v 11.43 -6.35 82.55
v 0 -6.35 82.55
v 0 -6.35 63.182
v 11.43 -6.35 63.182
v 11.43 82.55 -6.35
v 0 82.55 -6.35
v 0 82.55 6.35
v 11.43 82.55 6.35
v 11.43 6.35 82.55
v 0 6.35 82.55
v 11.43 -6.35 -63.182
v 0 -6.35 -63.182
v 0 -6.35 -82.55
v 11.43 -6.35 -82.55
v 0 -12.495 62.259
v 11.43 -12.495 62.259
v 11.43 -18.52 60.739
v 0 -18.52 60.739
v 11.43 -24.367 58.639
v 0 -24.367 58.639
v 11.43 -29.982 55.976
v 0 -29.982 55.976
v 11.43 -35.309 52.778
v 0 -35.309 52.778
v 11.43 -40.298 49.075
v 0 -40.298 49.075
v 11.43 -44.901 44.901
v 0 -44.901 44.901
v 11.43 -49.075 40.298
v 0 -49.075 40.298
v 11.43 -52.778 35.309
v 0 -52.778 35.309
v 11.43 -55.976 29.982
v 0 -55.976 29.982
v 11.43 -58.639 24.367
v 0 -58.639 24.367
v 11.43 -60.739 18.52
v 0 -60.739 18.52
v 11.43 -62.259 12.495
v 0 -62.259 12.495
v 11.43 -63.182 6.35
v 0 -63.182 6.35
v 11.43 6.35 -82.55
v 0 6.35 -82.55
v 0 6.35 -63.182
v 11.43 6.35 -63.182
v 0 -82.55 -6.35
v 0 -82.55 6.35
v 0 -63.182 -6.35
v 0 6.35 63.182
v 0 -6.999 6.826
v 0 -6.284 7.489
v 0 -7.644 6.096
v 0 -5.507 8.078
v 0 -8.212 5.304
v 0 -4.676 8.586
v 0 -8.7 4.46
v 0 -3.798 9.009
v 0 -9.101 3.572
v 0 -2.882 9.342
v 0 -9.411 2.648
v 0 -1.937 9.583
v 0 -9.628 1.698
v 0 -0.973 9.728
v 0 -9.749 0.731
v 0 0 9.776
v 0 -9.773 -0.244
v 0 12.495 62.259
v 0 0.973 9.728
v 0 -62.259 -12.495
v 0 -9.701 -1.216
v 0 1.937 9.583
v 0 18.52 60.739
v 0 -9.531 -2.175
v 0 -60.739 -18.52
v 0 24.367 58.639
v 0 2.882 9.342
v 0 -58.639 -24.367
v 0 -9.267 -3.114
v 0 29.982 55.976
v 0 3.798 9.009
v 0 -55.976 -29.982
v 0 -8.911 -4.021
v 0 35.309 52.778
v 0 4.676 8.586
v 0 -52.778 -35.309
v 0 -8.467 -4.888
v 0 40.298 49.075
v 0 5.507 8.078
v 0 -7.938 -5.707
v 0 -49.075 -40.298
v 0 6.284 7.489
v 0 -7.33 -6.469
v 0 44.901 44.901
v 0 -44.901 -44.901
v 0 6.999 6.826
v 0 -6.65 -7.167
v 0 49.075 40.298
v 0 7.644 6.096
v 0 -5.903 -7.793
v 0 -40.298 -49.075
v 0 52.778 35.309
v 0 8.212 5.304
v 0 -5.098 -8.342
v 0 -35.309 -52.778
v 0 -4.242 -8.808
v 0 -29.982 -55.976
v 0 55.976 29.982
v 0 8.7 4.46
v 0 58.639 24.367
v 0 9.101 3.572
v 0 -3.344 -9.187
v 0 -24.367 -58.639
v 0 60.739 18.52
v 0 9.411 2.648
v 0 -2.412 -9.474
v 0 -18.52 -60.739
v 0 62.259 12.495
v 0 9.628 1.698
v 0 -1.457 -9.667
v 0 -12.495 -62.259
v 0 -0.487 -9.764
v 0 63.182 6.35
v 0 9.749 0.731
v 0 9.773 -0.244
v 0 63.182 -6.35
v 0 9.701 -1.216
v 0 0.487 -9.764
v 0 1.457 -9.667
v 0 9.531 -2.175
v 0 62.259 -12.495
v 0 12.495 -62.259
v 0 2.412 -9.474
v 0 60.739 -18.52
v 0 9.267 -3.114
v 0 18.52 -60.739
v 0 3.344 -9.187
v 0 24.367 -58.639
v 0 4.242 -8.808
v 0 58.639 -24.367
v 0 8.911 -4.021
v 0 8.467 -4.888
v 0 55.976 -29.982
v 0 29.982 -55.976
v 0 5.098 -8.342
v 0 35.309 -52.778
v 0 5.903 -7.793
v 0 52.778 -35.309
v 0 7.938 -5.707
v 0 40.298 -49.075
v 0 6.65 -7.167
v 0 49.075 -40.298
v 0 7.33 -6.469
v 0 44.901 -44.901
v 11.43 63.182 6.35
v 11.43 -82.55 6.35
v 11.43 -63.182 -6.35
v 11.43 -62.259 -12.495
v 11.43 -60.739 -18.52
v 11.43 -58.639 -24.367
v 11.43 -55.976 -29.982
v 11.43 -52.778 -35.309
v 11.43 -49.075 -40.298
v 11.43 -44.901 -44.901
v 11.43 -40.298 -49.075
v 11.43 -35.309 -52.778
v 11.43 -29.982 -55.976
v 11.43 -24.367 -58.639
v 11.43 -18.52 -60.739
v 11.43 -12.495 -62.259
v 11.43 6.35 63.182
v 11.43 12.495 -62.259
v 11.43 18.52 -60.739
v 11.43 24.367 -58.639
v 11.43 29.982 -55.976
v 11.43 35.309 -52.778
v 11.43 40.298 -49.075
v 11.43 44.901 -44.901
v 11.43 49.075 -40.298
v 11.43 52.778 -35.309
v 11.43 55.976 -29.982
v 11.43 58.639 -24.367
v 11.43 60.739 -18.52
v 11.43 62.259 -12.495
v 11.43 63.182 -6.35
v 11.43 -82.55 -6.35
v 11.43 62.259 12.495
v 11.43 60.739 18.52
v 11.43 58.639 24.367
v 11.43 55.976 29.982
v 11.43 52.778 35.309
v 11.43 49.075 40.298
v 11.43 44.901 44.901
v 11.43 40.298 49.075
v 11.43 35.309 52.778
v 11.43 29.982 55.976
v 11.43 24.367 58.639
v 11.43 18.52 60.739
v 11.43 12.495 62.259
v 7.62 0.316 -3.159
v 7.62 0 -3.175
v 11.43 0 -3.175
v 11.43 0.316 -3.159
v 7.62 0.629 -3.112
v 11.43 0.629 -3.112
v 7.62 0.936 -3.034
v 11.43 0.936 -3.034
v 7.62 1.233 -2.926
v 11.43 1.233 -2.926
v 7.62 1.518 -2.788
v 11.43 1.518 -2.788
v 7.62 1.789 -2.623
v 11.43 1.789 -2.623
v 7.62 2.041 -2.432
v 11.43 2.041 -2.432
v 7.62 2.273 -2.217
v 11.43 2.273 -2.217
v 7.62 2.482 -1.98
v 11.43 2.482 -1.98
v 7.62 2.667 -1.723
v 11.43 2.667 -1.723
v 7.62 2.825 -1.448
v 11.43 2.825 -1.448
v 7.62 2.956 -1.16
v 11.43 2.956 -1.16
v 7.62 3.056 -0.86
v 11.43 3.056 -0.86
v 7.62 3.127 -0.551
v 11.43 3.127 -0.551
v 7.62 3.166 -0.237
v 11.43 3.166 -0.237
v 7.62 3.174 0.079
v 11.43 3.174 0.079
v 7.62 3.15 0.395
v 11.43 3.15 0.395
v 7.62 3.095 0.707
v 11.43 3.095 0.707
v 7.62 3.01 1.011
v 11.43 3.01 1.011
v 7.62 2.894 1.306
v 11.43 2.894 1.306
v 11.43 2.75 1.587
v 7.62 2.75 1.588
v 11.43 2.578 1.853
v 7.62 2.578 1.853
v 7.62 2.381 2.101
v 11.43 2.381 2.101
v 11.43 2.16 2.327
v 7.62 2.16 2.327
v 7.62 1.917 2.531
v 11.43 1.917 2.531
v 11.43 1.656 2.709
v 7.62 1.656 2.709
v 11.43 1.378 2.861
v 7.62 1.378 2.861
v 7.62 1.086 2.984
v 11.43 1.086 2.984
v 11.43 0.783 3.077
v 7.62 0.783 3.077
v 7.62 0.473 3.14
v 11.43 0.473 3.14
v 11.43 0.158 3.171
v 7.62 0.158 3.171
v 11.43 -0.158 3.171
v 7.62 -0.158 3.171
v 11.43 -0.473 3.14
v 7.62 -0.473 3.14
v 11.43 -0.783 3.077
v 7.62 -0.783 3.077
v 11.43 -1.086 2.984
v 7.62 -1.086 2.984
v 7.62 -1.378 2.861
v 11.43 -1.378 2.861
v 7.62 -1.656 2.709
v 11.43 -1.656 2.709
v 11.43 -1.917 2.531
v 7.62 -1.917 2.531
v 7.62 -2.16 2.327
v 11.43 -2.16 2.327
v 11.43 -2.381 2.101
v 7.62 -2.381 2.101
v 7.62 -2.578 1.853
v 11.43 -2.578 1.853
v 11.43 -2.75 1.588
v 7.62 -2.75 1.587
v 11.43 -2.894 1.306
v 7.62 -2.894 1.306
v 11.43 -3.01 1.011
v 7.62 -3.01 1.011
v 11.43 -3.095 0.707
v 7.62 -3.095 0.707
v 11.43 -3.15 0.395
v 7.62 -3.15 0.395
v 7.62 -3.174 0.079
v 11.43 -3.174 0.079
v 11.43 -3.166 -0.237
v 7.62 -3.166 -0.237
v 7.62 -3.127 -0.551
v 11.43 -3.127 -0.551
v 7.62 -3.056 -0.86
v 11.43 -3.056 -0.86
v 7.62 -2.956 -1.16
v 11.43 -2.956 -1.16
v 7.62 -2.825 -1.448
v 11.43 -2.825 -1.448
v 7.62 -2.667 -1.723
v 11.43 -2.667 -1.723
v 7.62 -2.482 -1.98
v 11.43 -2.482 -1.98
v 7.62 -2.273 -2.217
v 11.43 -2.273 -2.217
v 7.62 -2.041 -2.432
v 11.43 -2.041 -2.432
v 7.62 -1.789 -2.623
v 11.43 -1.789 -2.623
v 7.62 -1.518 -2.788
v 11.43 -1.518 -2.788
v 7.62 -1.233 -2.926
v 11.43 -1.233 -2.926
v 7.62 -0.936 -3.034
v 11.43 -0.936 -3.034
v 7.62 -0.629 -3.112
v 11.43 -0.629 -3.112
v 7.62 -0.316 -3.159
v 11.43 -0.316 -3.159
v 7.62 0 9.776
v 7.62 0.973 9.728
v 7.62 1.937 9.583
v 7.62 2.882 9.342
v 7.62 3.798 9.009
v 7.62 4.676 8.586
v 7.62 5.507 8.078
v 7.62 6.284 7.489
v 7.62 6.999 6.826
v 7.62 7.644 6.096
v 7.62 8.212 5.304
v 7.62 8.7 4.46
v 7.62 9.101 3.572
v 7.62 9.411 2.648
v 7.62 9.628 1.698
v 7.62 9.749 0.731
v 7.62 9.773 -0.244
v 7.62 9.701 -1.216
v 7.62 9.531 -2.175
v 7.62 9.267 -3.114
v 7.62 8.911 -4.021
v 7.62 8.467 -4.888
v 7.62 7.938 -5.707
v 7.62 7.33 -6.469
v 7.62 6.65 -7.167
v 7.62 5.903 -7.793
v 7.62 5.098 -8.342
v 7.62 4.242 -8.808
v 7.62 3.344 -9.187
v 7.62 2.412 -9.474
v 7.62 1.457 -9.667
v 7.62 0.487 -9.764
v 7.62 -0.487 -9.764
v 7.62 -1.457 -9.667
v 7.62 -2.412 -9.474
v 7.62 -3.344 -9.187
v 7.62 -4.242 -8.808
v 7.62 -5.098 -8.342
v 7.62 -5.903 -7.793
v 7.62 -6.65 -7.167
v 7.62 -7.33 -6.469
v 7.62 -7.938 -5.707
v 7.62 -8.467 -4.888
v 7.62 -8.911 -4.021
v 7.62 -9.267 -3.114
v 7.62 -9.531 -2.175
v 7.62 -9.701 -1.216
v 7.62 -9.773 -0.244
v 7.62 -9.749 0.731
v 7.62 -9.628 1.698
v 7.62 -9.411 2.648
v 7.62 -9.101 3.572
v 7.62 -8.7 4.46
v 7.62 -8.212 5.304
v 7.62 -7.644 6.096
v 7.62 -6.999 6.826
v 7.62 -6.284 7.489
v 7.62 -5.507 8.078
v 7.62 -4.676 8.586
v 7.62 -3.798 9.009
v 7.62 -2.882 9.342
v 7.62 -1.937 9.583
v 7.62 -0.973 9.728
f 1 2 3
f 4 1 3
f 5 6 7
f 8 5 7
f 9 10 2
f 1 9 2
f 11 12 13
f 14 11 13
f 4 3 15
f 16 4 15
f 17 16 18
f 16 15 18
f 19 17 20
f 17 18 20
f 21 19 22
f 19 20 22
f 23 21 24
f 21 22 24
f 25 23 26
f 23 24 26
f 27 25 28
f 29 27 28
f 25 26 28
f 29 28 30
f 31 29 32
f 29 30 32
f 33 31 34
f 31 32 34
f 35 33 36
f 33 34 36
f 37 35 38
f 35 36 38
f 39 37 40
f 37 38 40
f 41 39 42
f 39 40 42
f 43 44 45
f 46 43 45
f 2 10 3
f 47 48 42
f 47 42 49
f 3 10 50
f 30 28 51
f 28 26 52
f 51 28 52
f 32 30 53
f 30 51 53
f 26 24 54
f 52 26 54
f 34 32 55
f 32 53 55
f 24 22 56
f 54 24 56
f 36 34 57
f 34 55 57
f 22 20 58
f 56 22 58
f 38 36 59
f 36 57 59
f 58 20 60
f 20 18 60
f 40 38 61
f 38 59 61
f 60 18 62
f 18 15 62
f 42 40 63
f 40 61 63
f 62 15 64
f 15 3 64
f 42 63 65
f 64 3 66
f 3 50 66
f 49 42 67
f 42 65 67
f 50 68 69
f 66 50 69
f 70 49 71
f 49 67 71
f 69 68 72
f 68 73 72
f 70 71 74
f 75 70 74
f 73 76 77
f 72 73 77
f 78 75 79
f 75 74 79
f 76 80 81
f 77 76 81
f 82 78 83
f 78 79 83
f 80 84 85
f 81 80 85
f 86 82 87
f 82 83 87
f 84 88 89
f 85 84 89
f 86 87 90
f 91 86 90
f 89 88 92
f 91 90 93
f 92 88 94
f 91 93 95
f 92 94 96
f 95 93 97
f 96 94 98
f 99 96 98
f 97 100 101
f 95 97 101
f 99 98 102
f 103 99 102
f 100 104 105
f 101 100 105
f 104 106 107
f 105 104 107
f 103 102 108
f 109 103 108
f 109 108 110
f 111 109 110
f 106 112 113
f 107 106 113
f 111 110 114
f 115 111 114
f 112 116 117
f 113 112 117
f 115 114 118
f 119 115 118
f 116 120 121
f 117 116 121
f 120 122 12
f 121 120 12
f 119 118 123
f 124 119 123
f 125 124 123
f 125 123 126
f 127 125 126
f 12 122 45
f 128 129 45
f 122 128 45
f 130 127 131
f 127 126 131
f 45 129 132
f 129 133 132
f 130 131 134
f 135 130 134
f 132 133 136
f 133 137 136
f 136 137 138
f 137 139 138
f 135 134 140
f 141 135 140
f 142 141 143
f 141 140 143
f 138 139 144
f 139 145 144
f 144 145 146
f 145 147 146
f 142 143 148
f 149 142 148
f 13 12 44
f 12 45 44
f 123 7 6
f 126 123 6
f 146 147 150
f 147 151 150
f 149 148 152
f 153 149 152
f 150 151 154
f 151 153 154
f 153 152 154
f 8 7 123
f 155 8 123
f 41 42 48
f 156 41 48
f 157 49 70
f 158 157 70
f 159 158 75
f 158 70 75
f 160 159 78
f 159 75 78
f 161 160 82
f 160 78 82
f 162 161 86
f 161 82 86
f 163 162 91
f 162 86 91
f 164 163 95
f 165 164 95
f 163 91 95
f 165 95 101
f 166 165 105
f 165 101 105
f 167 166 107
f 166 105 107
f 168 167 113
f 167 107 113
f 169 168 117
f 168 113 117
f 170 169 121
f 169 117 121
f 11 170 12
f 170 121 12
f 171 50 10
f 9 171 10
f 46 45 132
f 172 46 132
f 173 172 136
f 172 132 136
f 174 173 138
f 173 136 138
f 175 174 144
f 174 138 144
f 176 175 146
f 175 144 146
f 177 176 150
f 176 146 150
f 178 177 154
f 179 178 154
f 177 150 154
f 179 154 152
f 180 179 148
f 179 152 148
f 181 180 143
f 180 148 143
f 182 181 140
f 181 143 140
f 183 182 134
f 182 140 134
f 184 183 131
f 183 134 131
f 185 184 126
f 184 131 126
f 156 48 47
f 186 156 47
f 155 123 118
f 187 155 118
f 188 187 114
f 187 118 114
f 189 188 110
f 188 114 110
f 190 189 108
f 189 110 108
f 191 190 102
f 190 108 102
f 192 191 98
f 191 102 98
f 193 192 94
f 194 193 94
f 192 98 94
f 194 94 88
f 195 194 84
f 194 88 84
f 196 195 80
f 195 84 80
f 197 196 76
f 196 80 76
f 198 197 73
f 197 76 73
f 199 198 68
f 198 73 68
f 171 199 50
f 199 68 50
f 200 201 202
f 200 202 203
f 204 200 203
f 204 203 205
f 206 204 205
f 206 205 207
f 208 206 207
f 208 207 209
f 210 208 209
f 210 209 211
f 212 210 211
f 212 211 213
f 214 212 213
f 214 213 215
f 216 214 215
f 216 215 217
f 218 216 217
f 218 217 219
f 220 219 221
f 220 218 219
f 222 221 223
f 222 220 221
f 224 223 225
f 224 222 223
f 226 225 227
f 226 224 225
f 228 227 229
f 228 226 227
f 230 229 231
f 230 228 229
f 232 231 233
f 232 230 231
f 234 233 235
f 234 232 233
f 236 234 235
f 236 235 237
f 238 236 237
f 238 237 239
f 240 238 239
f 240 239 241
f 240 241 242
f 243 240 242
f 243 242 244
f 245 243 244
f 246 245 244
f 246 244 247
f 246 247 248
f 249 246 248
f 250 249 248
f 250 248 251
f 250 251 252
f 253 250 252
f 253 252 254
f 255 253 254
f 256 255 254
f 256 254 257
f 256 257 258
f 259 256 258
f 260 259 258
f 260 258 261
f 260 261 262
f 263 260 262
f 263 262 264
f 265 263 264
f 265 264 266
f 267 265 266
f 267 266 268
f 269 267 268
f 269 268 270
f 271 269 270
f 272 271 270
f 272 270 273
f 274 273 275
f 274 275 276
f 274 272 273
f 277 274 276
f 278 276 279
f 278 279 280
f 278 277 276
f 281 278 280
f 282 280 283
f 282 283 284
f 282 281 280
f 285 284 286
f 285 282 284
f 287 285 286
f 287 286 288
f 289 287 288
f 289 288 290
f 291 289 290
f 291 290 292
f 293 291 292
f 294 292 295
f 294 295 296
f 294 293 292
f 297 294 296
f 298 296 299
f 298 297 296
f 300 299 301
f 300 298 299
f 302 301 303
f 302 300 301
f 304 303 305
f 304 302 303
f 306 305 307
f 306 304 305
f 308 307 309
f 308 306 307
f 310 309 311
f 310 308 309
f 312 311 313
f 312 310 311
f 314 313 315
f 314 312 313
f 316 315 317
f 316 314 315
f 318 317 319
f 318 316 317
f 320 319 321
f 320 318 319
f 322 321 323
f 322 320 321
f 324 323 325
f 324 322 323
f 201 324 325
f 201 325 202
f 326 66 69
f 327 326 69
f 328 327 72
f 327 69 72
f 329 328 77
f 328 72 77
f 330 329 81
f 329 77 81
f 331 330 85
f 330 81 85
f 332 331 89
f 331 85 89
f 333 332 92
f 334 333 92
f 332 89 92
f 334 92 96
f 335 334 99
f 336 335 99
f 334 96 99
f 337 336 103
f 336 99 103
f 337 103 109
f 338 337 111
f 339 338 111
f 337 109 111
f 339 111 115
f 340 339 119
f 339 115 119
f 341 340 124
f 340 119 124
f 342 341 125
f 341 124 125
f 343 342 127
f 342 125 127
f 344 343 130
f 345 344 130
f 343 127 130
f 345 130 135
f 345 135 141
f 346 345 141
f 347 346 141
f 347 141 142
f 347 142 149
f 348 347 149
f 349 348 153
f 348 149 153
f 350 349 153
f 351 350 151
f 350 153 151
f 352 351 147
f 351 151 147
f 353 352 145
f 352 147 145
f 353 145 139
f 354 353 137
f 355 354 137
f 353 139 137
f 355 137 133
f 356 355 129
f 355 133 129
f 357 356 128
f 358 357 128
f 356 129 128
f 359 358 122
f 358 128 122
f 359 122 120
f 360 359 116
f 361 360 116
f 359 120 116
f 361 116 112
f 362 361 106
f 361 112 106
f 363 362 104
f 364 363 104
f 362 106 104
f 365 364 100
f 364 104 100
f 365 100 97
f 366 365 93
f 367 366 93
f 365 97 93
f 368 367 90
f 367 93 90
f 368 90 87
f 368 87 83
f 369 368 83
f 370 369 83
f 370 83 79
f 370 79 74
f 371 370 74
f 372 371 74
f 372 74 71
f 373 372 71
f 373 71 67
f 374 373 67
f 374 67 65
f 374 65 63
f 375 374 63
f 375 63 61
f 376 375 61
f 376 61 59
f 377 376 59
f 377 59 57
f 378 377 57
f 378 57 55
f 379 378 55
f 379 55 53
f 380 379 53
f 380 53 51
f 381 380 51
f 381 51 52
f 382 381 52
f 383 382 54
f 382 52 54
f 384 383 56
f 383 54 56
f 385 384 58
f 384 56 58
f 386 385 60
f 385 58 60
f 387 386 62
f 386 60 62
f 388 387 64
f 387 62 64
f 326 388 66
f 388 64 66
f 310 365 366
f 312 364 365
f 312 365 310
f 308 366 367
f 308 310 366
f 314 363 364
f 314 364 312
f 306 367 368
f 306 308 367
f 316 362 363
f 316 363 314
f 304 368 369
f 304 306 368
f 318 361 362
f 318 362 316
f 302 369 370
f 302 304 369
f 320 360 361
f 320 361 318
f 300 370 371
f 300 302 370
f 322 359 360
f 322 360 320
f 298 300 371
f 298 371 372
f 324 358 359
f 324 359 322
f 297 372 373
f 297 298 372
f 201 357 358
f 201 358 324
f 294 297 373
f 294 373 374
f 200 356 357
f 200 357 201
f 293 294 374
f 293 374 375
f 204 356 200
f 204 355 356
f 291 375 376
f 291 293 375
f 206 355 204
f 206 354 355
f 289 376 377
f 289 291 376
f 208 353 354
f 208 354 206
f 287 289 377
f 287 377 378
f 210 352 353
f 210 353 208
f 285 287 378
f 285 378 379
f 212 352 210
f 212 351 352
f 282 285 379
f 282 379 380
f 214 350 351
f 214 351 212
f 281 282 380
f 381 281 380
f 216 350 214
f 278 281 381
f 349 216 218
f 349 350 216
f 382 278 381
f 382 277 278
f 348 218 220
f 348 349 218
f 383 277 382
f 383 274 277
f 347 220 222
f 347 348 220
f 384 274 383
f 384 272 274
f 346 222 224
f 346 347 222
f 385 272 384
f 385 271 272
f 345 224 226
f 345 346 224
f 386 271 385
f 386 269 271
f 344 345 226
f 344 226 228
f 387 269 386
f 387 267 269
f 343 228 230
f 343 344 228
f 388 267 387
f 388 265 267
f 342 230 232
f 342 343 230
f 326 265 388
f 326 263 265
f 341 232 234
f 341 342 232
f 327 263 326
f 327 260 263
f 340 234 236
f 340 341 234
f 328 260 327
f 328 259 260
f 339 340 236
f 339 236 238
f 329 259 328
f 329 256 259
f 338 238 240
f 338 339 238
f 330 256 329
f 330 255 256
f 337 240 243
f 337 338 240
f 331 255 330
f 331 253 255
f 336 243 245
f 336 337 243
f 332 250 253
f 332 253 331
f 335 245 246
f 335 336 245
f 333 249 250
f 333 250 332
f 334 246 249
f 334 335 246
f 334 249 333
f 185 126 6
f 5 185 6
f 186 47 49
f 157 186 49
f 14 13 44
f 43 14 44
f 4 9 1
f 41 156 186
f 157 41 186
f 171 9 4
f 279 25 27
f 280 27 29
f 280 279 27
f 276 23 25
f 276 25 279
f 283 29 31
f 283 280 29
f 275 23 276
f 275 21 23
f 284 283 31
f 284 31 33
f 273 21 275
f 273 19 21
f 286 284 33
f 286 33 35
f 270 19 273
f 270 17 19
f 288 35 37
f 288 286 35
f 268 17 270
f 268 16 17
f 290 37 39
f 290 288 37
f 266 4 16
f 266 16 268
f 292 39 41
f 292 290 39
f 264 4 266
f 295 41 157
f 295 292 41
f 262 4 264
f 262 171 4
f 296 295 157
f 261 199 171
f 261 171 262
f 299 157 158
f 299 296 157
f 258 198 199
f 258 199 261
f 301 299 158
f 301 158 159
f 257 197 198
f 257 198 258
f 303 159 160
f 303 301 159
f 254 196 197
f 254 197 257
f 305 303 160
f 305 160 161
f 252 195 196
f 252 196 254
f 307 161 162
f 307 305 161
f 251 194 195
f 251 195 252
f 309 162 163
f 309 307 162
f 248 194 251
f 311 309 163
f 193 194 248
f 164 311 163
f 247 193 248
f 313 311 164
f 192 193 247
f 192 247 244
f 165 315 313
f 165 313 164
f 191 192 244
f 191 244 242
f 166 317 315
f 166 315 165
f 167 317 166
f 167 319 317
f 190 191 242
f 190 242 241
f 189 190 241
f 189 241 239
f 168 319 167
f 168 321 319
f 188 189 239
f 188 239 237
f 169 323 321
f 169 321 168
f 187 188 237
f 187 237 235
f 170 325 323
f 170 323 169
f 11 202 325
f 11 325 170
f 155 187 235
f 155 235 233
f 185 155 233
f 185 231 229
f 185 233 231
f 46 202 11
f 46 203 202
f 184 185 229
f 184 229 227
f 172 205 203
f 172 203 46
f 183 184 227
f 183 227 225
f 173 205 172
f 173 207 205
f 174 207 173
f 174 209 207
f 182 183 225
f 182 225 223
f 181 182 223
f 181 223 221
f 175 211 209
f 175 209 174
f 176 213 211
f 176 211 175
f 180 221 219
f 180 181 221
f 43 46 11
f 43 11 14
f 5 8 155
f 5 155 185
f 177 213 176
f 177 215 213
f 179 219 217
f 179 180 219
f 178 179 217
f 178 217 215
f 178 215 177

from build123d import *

# Parameters (mm, degrees)
SKETCH1_R           = 3.175
BOSS_EXTRUDE1_DEPTH = 11.43
SKETCH2_R           = 9.776464607
CUT_EXTRUDE1_DEPTH  = 7.62


with BuildPart() as part:
    # Sketch1 → Boss-Extrude1 (new body)
    with BuildSketch(Plane(origin=(0, 0, 0), x_dir=(0, 0, -1), z_dir=(1, 0, 0))):
        with BuildLine():
            Line((6.35, 82.55), (-6.35, 82.55))
            Line((-6.35, 82.55), (-6.35, 63.181702256))
            ThreePointArc((-6.35, 63.181702256), (-44.901280605, 44.901280605), (-63.181702256, 6.35))
            Line((-63.181702256, 6.35), (-82.55, 6.35))
            Line((-82.55, 6.35), (-82.55, -6.35))
            Line((-82.55, -6.35), (-63.181702256, -6.35))
            ThreePointArc((-63.181702256, -6.35), (-44.901280605, -44.901280605), (-6.35, -63.181702256))
            Line((-6.35, -63.181702256), (-6.35, -82.55))
            Line((-6.35, -82.55), (6.35, -82.55))
            Line((6.35, -82.55), (6.35, -63.181702256))
            ThreePointArc((6.35, -63.181702256), (44.901280605, -44.901280605), (63.181702256, -6.35))
            Line((63.181702256, -6.35), (82.55, -6.35))
            Line((82.55, -6.35), (82.55, 6.35))
            Line((82.55, 6.35), (63.181702256, 6.35))
            ThreePointArc((63.181702256, 6.35), (44.901280605, 44.901280605), (6.35, 63.181702256))
            Line((6.35, 63.181702256), (6.35, 82.55))
        make_face()
        Circle(SKETCH1_R, mode=Mode.SUBTRACT)
    extrude(amount=BOSS_EXTRUDE1_DEPTH)

    # Sketch2 → Cut-Extrude1 (cut)
    with BuildSketch(Plane.ZY):
        Circle(SKETCH2_R)
    extrude(amount=-CUT_EXTRUDE1_DEPTH, mode=Mode.SUBTRACT)


solid = part.part
